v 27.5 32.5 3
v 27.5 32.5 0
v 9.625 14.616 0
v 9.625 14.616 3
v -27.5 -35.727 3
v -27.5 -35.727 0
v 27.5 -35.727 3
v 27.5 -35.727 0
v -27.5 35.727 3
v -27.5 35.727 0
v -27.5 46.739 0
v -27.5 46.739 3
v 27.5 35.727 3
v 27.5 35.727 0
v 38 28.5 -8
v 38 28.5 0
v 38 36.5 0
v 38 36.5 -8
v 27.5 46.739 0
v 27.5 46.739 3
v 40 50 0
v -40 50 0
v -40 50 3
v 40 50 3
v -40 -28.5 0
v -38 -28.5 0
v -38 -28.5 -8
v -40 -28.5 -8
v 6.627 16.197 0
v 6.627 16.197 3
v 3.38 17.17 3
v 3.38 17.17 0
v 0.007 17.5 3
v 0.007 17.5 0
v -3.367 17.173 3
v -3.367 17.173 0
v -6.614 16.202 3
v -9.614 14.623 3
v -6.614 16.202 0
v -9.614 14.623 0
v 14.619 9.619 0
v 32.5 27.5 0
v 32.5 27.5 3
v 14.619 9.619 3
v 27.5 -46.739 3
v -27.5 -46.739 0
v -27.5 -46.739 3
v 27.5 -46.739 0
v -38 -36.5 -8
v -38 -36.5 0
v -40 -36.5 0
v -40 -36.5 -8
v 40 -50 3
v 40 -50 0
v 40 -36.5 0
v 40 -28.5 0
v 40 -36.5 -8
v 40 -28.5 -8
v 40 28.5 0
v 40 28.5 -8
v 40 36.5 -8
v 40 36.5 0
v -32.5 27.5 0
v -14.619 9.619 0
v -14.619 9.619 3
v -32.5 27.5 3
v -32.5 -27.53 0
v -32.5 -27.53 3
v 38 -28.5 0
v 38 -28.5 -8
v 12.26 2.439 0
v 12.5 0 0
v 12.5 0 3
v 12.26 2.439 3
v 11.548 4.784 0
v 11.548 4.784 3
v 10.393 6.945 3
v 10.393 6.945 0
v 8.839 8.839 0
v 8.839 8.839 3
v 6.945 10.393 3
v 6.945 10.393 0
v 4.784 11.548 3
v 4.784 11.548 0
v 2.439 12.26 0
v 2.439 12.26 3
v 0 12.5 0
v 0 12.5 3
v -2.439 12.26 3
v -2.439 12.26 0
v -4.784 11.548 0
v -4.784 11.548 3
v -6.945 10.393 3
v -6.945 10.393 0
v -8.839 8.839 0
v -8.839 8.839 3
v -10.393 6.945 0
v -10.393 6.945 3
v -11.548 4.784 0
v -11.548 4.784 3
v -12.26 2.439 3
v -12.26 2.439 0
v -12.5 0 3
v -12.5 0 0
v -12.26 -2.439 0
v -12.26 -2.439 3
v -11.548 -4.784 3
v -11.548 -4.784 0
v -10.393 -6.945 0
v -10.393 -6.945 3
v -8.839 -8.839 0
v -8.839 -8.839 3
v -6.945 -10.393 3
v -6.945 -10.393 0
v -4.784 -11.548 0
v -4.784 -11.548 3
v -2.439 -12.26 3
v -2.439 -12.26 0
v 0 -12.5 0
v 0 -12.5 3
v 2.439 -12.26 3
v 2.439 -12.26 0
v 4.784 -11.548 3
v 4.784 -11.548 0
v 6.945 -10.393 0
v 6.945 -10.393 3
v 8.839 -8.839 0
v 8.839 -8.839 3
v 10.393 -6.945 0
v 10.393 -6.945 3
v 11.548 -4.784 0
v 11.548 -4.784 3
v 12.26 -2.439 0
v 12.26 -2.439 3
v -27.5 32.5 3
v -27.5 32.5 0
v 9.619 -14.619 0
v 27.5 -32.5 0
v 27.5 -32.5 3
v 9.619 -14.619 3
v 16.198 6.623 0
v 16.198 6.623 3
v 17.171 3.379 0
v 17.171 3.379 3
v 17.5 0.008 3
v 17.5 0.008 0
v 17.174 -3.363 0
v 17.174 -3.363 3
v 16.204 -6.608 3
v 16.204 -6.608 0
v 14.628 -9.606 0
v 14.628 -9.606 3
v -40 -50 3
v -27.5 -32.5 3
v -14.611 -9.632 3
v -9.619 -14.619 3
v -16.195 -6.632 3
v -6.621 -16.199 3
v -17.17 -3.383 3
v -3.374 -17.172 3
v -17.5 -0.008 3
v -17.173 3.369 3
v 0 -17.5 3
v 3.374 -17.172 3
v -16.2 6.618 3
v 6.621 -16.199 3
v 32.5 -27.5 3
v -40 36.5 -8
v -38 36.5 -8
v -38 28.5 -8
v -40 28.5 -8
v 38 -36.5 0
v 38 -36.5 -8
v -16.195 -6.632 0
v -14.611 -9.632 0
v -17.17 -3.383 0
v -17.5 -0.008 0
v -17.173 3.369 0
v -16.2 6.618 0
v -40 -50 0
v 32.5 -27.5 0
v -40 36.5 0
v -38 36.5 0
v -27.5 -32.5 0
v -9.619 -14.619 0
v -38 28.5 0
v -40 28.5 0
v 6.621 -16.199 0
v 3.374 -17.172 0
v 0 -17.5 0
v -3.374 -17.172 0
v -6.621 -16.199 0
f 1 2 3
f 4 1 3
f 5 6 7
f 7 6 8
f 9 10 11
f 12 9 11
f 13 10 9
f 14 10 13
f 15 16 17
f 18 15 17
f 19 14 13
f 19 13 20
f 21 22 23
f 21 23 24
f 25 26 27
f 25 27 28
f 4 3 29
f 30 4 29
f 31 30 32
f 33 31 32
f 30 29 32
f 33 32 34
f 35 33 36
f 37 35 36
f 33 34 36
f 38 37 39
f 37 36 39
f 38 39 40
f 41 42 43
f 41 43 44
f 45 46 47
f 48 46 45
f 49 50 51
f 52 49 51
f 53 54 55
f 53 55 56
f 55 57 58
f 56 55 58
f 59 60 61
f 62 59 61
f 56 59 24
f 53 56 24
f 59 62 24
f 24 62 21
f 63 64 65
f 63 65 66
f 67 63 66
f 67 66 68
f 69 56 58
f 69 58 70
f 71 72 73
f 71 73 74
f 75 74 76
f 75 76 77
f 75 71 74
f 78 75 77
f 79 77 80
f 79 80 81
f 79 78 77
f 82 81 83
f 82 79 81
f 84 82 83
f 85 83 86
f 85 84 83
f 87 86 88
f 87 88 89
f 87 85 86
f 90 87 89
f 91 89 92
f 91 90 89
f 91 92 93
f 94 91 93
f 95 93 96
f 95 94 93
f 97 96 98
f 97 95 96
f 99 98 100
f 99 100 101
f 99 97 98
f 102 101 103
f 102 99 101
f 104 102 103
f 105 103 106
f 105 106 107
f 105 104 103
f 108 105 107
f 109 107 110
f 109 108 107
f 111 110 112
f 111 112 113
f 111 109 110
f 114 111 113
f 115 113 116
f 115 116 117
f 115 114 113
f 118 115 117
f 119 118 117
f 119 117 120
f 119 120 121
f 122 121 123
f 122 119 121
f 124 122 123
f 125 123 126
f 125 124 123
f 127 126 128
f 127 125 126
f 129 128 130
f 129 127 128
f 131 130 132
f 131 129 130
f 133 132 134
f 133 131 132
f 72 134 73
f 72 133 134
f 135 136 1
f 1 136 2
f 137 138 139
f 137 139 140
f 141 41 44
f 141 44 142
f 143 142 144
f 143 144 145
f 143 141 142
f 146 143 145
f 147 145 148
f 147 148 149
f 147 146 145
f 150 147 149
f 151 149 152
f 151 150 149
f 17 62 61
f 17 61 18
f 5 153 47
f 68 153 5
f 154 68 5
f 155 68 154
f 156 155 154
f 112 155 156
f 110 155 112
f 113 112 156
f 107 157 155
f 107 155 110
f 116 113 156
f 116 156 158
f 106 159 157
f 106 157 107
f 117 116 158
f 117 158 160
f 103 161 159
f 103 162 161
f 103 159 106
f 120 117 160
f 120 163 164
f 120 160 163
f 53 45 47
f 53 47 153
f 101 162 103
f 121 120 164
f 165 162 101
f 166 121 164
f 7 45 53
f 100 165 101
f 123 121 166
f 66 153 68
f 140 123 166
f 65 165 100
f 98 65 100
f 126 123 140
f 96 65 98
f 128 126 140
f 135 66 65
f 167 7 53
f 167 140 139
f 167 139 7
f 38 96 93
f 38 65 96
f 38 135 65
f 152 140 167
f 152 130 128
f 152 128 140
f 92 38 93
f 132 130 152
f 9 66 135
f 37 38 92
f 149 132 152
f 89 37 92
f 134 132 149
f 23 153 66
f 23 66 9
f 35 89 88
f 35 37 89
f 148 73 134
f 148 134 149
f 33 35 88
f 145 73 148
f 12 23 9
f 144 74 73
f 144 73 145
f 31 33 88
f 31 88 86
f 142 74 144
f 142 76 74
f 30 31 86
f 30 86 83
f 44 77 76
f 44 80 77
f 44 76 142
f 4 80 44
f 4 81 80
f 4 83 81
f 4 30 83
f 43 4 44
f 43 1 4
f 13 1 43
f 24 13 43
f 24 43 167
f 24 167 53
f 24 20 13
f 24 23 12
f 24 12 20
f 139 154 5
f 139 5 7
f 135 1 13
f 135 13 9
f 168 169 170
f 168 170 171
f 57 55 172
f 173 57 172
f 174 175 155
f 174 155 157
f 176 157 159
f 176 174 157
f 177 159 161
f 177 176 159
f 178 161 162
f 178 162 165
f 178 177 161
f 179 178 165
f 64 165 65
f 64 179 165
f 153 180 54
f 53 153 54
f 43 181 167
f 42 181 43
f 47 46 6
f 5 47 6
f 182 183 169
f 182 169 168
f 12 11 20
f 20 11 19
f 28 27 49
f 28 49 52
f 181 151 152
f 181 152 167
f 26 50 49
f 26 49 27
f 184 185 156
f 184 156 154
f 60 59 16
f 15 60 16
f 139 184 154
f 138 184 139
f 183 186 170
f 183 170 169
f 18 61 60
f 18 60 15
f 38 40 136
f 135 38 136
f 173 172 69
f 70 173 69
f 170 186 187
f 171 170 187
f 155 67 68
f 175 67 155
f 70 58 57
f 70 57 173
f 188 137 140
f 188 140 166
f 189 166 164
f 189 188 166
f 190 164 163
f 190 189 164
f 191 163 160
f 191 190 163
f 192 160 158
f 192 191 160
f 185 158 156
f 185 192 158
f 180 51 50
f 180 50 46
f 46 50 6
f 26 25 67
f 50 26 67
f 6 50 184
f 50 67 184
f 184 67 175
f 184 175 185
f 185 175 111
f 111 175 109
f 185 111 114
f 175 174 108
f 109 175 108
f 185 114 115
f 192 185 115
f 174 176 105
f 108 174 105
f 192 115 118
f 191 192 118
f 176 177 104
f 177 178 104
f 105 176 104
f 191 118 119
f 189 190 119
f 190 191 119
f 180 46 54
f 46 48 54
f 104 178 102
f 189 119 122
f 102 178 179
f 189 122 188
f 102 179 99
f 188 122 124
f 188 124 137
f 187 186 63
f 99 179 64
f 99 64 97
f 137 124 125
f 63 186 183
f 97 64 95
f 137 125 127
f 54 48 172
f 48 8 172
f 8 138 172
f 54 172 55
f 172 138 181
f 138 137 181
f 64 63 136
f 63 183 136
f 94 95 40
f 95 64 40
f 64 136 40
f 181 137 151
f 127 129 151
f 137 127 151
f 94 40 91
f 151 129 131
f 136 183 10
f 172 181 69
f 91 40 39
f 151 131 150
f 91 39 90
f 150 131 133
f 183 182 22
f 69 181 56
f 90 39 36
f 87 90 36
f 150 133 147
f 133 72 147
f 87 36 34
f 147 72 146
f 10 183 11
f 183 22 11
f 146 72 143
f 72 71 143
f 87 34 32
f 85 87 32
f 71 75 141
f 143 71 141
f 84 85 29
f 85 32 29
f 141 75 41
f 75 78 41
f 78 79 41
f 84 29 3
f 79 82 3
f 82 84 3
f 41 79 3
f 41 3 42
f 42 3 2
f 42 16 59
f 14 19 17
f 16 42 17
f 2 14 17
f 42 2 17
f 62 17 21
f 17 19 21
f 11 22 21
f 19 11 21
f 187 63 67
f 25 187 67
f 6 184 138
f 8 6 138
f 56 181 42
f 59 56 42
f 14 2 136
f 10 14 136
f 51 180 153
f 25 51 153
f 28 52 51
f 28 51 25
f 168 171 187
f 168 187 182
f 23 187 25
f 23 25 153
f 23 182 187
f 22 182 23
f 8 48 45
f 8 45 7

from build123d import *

# Parameters (mm, degrees)
SKETCH1_W           = 80
SKETCH1_H           = 100
SKETCH1_R           = 12.5
SKETCH1_W_2         = 55
SKETCH1_H_2         = 11.012232525
BOSS_EXTRUDE4_DEPTH = 3
SKETCH4_W           = 2
SKETCH4_H           = 8
BOSS_EXTRUDE7_DEPTH = 8


with BuildPart() as part:
    # Sketch1 → Boss-Extrude4 (new body)
    with BuildSketch(Plane.XY):
        Rectangle(SKETCH1_W, SKETCH1_H)
        Circle(SKETCH1_R, mode=Mode.SUBTRACT)
        with BuildLine():
            Line((-27.5, 32.5), (27.5, 32.5))
            Line((27.5, 32.5), (9.624571705, 14.615663498))
            ThreePointArc((9.624571705, 14.615663498), (0.00658569, 17.499998761), (-9.613568497, 14.622903294))
            Line((-9.613568497, 14.622903294), (-27.5, 32.5))
        make_face(mode=Mode.SUBTRACT)
        with BuildLine():
            Line((-32.5, 27.5), (-32.5, -27.529900959))
            Line((-32.5, -27.529900959), (-14.610866481, -9.631852402))
            ThreePointArc((-14.610866481, -9.631852402), (-17.49999836, -0.007575188), (-14.619199644, 9.619199644))
            Line((-14.619199644, 9.619199644), (-32.5, 27.5))
        make_face(mode=Mode.SUBTRACT)
        with BuildLine():
            Line((-27.5, -32.5), (27.5, -32.5))
            Line((27.5, -32.5), (9.619199644, -14.619199644))
            ThreePointArc((9.619199644, -14.619199644), (0, -17.5), (-9.619199644, -14.619199644))
            Line((-9.619199644, -14.619199644), (-27.5, -32.5))
        make_face(mode=Mode.SUBTRACT)
        with BuildLine():
            Line((32.5, 27.5), (14.619199644, 9.619199644))
            ThreePointArc((14.619199644, 9.619199644), (17.4999982, 0.007937724), (14.627919862, -9.60593361))
            Line((14.627919862, -9.60593361), (32.5, -27.5))
            Line((32.5, -27.5), (32.5, 27.5))
        make_face(mode=Mode.SUBTRACT)
        with Locations((0, -41.233086376)):
            Rectangle(SKETCH1_W_2, SKETCH1_H_2, mode=Mode.SUBTRACT)
        with Locations((0, 41.233086376)):
            Rectangle(SKETCH1_W_2, SKETCH1_H_2, mode=Mode.SUBTRACT)
    extrude(amount=BOSS_EXTRUDE4_DEPTH)

    # Sketch4 → Boss-Extrude7 (add)
    with BuildSketch(Plane(origin=(0, 0, 0), x_dir=(-1, 0, 0), z_dir=(0, 0, -1))):
        with Locations((-39, 32.5)):
            Rectangle(SKETCH4_W, SKETCH4_H)
        with Locations((-39, -32.5)):
            Rectangle(SKETCH4_W, SKETCH4_H)
        with Locations((39, 32.5)):
            Rectangle(SKETCH4_W, SKETCH4_H)
        with Locations((39, -32.5)):
            Rectangle(SKETCH4_W, SKETCH4_H)
    extrude(amount=BOSS_EXTRUDE7_DEPTH)


solid = part.part
